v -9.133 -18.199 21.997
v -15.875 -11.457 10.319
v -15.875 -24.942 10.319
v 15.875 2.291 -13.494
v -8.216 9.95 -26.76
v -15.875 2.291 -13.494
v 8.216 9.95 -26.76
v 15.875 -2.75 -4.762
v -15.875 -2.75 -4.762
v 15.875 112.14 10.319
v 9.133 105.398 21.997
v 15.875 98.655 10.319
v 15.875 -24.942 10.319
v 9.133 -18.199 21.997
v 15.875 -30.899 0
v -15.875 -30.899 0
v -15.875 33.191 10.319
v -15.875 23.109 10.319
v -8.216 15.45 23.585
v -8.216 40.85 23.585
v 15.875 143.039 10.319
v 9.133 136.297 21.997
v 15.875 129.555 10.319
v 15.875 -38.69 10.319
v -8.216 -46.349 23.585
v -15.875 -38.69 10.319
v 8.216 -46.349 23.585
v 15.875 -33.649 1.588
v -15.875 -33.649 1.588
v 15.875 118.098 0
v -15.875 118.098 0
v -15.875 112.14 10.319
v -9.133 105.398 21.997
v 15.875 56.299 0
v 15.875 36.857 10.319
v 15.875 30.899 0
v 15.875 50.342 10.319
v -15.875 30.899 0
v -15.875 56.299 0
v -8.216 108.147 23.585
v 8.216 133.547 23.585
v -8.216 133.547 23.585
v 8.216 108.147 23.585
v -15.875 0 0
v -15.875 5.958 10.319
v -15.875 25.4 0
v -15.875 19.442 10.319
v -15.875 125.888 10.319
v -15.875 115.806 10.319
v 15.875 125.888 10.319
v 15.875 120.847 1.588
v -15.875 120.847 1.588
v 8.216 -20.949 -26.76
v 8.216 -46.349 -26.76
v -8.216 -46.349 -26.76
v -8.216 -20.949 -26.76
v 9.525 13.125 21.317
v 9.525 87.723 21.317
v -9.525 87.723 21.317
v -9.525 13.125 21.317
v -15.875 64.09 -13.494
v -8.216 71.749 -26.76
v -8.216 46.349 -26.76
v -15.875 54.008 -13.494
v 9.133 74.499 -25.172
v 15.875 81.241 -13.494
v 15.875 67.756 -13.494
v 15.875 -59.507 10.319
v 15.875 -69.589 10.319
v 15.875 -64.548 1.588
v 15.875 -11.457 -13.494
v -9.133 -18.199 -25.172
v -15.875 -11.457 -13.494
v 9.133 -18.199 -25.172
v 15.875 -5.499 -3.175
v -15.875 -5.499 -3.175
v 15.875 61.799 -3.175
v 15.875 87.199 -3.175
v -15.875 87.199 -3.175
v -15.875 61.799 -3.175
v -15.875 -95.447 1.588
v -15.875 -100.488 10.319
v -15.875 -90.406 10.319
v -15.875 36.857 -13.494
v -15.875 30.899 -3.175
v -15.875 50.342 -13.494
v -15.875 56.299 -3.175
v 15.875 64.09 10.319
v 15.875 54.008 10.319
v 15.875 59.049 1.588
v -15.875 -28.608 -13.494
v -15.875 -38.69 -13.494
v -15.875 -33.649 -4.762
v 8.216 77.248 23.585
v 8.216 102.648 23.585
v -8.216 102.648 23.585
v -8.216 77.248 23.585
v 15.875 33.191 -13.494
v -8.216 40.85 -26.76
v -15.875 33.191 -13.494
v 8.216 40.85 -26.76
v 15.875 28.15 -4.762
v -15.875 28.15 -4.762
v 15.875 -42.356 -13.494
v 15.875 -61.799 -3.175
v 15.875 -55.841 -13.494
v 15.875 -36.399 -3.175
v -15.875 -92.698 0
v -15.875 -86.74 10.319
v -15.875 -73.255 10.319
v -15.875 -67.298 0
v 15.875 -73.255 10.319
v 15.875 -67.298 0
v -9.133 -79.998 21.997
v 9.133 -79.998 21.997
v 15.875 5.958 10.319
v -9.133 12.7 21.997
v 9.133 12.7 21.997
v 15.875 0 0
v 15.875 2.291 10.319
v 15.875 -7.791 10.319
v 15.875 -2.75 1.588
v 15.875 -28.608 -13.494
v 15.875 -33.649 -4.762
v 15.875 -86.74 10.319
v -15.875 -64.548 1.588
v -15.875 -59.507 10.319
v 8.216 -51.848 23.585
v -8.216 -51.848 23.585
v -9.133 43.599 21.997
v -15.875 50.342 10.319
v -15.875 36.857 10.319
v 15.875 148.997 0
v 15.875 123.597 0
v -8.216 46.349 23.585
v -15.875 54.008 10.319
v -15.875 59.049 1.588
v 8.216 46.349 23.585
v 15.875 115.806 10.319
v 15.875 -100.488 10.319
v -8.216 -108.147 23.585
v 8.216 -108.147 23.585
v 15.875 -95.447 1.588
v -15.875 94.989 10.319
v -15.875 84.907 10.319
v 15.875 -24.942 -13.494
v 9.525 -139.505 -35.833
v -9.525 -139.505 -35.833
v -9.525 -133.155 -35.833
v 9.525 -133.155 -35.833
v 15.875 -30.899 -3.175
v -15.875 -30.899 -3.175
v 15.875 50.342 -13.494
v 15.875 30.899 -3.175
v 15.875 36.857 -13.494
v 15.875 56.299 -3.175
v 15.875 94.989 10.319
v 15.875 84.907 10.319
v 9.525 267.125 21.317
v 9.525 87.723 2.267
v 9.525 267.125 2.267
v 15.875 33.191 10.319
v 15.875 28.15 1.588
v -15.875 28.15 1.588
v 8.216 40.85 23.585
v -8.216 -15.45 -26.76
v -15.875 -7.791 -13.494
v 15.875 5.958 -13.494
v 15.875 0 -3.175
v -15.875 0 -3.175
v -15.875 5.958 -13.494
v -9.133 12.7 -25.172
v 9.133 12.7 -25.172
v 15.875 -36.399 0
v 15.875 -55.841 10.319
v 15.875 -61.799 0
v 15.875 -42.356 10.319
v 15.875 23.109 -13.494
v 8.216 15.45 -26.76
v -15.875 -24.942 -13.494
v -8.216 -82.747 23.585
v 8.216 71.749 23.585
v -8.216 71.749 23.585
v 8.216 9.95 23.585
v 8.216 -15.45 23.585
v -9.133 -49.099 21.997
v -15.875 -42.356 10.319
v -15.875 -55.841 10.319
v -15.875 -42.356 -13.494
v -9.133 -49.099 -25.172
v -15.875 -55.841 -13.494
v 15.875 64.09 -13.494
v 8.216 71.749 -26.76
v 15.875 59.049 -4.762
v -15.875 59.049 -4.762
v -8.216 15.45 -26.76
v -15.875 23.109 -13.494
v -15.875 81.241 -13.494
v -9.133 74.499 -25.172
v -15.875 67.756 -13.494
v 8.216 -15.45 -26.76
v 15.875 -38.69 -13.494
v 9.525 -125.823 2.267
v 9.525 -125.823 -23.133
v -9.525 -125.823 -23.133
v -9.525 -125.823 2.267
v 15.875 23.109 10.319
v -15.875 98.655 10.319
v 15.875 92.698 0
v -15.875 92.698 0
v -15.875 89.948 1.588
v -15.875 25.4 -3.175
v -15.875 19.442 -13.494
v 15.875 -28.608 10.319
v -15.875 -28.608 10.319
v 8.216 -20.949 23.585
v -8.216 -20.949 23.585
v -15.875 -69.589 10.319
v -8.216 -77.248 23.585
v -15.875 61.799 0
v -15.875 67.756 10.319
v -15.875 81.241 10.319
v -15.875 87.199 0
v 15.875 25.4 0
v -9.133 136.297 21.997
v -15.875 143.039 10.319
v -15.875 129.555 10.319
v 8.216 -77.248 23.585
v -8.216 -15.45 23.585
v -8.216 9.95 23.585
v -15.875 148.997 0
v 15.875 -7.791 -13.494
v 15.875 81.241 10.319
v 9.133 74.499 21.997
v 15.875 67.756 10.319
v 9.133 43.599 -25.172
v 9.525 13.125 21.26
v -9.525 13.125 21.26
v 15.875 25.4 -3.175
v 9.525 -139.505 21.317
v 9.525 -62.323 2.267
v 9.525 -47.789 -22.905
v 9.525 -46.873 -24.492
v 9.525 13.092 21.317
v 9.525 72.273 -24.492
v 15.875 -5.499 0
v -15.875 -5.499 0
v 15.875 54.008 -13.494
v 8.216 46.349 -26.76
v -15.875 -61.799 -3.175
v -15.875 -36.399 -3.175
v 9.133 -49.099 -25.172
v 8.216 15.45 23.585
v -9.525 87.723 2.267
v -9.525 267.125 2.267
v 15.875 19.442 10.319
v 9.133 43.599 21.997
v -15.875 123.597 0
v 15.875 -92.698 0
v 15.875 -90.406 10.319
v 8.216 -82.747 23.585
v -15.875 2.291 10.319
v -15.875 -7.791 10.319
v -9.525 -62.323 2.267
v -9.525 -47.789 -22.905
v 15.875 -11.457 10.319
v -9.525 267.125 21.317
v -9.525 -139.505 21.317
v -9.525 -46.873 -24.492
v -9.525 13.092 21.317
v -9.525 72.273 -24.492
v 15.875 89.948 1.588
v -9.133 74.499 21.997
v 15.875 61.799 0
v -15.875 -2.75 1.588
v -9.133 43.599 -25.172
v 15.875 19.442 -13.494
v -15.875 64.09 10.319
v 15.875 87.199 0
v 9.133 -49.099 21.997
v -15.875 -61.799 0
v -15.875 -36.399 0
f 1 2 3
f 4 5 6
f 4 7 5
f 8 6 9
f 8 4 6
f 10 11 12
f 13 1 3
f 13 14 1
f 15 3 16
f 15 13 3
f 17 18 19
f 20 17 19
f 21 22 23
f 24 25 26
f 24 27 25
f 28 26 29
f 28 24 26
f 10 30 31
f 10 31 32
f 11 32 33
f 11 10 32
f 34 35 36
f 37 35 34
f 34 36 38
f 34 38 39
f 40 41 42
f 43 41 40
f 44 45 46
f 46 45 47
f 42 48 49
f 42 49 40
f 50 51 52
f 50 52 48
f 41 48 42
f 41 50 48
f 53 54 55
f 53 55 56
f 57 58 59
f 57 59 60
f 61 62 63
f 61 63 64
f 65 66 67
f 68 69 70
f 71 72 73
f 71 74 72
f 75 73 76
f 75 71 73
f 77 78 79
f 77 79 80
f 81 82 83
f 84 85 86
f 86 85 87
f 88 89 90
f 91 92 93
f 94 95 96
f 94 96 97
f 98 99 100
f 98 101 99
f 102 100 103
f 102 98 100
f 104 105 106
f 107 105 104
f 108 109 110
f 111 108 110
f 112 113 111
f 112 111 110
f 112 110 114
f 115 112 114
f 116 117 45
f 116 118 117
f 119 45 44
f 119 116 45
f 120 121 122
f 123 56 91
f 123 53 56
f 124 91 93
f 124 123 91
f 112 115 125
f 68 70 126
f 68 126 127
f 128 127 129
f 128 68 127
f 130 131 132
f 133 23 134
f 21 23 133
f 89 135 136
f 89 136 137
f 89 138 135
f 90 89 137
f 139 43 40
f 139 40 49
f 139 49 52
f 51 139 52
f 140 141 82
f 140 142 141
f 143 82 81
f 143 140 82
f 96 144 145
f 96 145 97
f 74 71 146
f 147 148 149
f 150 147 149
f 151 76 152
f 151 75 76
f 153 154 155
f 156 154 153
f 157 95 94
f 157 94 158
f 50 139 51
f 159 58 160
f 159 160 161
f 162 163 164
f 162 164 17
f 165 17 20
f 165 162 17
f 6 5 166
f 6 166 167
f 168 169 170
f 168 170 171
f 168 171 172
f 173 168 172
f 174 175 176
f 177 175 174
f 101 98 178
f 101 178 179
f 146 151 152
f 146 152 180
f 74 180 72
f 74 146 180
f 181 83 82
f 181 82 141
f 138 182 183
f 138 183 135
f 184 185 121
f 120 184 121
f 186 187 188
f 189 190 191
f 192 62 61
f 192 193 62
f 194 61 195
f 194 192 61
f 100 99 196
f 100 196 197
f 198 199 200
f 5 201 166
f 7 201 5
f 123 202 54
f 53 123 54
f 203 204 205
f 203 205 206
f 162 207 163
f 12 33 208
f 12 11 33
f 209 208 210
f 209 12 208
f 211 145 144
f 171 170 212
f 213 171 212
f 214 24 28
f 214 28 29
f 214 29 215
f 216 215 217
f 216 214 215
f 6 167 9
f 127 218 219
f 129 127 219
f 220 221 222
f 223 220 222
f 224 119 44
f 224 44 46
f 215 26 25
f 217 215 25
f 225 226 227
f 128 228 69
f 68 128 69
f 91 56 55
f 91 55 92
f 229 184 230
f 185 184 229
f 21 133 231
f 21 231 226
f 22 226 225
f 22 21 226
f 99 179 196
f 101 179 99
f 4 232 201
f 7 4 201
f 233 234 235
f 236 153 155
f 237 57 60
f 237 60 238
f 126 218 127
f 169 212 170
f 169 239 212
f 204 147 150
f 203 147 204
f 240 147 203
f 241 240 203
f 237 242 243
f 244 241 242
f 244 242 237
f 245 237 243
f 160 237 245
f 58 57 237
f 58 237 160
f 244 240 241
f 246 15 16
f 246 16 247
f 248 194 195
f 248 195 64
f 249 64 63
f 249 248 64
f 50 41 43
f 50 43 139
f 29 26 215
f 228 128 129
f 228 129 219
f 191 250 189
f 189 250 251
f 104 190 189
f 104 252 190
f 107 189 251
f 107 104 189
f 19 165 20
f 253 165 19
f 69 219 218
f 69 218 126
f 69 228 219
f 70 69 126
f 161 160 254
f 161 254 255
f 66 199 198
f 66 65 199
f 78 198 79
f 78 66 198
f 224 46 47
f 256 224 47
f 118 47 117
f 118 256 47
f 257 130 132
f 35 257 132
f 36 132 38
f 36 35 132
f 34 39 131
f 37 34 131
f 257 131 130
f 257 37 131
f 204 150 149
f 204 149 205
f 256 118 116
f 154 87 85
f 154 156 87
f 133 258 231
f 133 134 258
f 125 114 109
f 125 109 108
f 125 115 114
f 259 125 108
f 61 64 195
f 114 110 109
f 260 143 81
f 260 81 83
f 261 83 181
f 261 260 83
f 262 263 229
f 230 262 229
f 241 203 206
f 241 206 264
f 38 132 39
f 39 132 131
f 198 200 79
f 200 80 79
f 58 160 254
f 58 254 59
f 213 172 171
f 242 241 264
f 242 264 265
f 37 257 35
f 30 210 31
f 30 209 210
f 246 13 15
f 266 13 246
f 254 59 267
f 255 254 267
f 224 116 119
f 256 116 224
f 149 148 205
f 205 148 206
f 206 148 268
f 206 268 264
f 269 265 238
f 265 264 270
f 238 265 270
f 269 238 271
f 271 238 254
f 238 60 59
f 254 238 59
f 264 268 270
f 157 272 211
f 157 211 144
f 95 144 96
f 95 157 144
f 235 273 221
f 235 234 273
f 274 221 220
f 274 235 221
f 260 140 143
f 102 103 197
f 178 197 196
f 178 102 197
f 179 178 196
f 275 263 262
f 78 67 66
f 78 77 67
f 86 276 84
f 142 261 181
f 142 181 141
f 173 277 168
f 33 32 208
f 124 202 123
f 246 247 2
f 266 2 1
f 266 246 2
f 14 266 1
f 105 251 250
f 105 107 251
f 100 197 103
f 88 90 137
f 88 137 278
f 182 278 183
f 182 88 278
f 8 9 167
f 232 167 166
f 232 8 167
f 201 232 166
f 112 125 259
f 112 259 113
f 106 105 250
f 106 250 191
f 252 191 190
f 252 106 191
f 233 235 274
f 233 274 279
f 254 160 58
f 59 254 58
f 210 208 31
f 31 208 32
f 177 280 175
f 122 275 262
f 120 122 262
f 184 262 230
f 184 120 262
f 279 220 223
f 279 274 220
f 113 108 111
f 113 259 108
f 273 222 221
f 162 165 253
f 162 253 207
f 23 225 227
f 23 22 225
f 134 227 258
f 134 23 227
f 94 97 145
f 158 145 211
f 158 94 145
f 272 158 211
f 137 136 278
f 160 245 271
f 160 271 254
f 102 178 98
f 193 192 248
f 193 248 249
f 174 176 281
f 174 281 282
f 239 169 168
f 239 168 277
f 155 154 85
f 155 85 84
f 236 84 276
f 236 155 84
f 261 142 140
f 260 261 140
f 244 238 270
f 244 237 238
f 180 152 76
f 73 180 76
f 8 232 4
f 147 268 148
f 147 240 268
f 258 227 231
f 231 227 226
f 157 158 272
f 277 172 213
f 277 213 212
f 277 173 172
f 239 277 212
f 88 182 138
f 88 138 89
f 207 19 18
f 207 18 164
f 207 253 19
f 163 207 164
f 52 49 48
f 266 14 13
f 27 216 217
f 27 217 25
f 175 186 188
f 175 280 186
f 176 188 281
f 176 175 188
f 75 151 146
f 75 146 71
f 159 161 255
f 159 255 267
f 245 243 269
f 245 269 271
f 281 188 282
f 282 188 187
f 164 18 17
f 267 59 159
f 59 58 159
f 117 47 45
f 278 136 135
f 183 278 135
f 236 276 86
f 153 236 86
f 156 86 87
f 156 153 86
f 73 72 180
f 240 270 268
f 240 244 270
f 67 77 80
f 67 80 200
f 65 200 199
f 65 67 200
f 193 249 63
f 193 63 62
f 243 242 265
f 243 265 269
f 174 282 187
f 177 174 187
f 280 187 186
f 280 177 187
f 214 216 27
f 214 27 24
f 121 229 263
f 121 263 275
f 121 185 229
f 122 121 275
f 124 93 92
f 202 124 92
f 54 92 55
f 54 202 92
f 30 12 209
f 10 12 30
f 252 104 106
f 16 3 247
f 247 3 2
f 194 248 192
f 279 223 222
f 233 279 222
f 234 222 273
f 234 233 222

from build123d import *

# Parameters (mm, degrees)
F1_W     = 3.175
F1_H     = 9.525
F2_DEPTH = 9.525
F1_W_2   = 179.4027834434
F1_H_2   = 19.05
F3_DEPTH = 9.525
F4_DEPTH = 15.875
F6_DEPTH = 177.8


with BuildPart() as f2:
    # F1 (on Right) → F2 (new body, symmetric)
    with BuildSketch(Plane.YZ):
        Polygon((-37.7075152621, 2.2672726281), (-48.7060378902, 21.3172726281), (-139.5049298612, 21.3172726281), (-139.5049298612, -35.8327273719), (-133.1549298612, -35.8327273719), (-125.8225814425, -23.1327273719), (-125.8225814425, 2.2672726281), (-62.3225814425, 2.2672726281), align=None)
        Polygon((-29.5902419379, 2.2672726281), (-18.5917193098, 21.3172726281), (-48.7060378902, 21.3172726281), (-37.7075152621, 2.2672726281), align=None)
        Polygon((-6.8082628621, 2.2672726281), (-17.8067854902, 21.3172726281), (-18.5917193098, 21.3172726281), (-29.5902419379, 2.2672726281), align=None)
        Polygon((9.950378257, 17.2345606957), (9.950378257, 21.3172726281), (-17.8067854902, 21.3172726281), (-6.8082628621, 2.2672726281), (1.3090104621, 2.2672726281), align=None)
        Polygon((13.125378257, 21.2602685025), (13.125378257, 11.7922726281), (13.125378257, 2.2672726281), (24.0909895379, 2.2672726281), align=None)
        with Locations((11.537878257, 7.0297726281)):
            Rectangle(F1_W, F1_H)
        Polygon((12.3075330902, 21.3172726281), (9.950378257, 17.2345606957), (9.950378257, 11.7922726281), (13.125378257, 11.7922726281), (13.125378257, 21.2602685025), (13.0924669098, 21.3172726281), align=None)
        Polygon((9.950378257, 11.7922726281), (9.950378257, 17.2345606957), (1.3090104621, 2.2672726281), (9.950378257, 2.2672726281), align=None)
        Polygon((12.3075330902, 21.3172726281), (9.950378257, 21.3172726281), (9.950378257, 17.2345606957), align=None)
        Polygon((13.125378257, 21.3172726281), (13.125378257, 21.2602685025), (24.0909895379, 2.2672726281), (87.7225948136, 2.2672726281), (87.7225948136, 21.3172726281), align=None)
        Polygon((0, 0), (1.3090104621, 2.2672726281), (-6.8082628621, 2.2672726281), (-5.4992524, 0), (-30.8992524, 0), (-29.5902419379, 2.2672726281), (-37.7075152621, 2.2672726281), (-62.3225814425, 2.2672726281), (-51.9763694491, -15.6528922105), (-47.7894943379, -22.9047726281), (-42.7485048, -14.1735226281), (-41.3736894715, -14.9672726281), (-44.8405059529, -24.4922726281), (-34.4873710954, -24.4922726281), (47.6579024332, -24.4922726281), (72.2729641566, -24.4922726281), (87.7225948136, 2.2672726281), (24.0909895379, 2.2672726281), (25.4, 0), (9.950378257, 0), align=None)
        Polygon((13.125378257, 2.2672726281), (9.950378257, 2.2672726281), (9.950378257, 0), (25.4, 0), (24.0909895379, 2.2672726281), align=None)
        Polygon((9.950378257, 2.2672726281), (1.3090104621, 2.2672726281), (0, 0), (9.950378257, 0), align=None)
        Polygon((-5.4992524, 0), (-6.8082628621, 2.2672726281), (-29.5902419379, 2.2672726281), (-30.8992524, 0), align=None)
        Polygon((-42.7485048, -14.1735226281), (-47.7894943379, -22.9047726281), (-46.8729507855, -24.4922726281), (-44.8405059529, -24.4922726281), (-41.3736894715, -14.9672726281), align=None)
    extrude(amount=F2_DEPTH, both=True)


with BuildPart() as f3:
    # F1 (on Right) → F3 (new body, symmetric)
    with BuildSketch(Plane.YZ):
        with Locations((177.4239865353, 11.7922726281)):
            Rectangle(F1_W_2, F1_H_2)
    extrude(amount=F3_DEPTH, both=True)


with BuildPart() as f4:
    # F0 (on Right) → F4 (new body, symmetric)
    with BuildSketch(Plane.YZ):
        Polygon((102.648144371, 23.5845452561), (77.248144371, 23.5845452561), (89.948144371, 1.5875), align=None)
    extrude(amount=F4_DEPTH, both=True)


with BuildPart() as f4b:
    # F0 (on Right) → F4, piece 2 (new body, symmetric)
    with BuildSketch(Plane.YZ):
        Polygon((61.798513714, 0), (87.198513714, 0), (74.498513714, 21.9970452561), align=None)
    extrude(amount=F4_DEPTH, both=True)


with BuildPart() as f4c:
    # F0 (on Right) → F4, piece 3 (new body, symmetric)
    with BuildSketch(Plane.YZ):
        Polygon((74.498513714, -25.1720452561), (87.198513714, -3.175), (61.798513714, -3.175), align=None)
    extrude(amount=F4_DEPTH, both=True)


with BuildPart() as f4d:
    # F0 (on Right) → F4, piece 4 (new body, symmetric)
    with BuildSketch(Plane.YZ):
        Polygon((71.748891971, -26.7595452561), (59.048891971, -4.7625), (46.348891971, -26.7595452561), align=None)
    extrude(amount=F4_DEPTH, both=True)


with BuildPart() as f4e:
    # F0 (on Right) → F4, piece 5 (new body, symmetric)
    with BuildSketch(Plane.YZ):
        Polygon((56.299261314, -3.175), (30.899261314, -3.175), (43.599261314, -25.1720452561), align=None)
    extrude(amount=F4_DEPTH, both=True)


with BuildPart() as f4f:
    # F0 (on Right) → F4, piece 6 (new body, symmetric)
    with BuildSketch(Plane.YZ):
        Polygon((46.348891971, 23.5845452561), (59.048891971, 1.5875), (71.748891971, 23.5845452561), align=None)
    extrude(amount=F4_DEPTH, both=True)


with BuildPart() as f4g:
    # F0 (on Right) → F4, piece 7 (new body, symmetric)
    with BuildSketch(Plane.YZ):
        Polygon((43.599261314, 21.9970452561), (30.899261314, 0), (43.599261314, 0), (56.299261314, 0), align=None)
    extrude(amount=F4_DEPTH, both=True)


with BuildPart() as f4h:
    # F0 (on Right) → F4, piece 8 (new body, symmetric)
    with BuildSketch(Plane.YZ):
        Polygon((40.849630657, -26.7595452561), (28.149630657, -4.7625), (15.449630657, -26.7595452561), align=None)
    extrude(amount=F4_DEPTH, both=True)


with BuildPart() as f4i:
    # F0 (on Right) → F4, piece 9 (new body, symmetric)
    with BuildSketch(Plane.YZ):
        Polygon((15.449630657, 23.5845452561), (28.149630657, 1.5875), (40.849630657, 23.5845452561), align=None)
    extrude(amount=F4_DEPTH, both=True)


with BuildPart() as f4j:
    # F0 (on Right) → F4, piece 10 (new body, symmetric)
    with BuildSketch(Plane.YZ):
        Polygon((12.7, 21.9970452561), (0, 0), (25.4, 0), align=None)
    extrude(amount=F4_DEPTH, both=True)


with BuildPart() as f4k:
    # F0 (on Right) → F4, piece 11 (new body, symmetric)
    with BuildSketch(Plane.YZ):
        Polygon((25.4, -3.175), (0, -3.175), (12.7, -25.1720452561), align=None)
    extrude(amount=F4_DEPTH, both=True)


with BuildPart() as f4l:
    # F0 (on Right) → F4, piece 12 (new body, symmetric)
    with BuildSketch(Plane.YZ):
        Polygon((9.950378257, -26.7595452561), (-2.749621743, -4.7625), (-15.449621743, -26.7595452561), align=None)
    extrude(amount=F4_DEPTH, both=True)


with BuildPart() as f4m:
    # F0 (on Right) → F4, piece 13 (new body, symmetric)
    with BuildSketch(Plane.YZ):
        Polygon((-15.449621743, 23.5845452561), (-2.749621743, 1.5875), (9.950378257, 23.5845452561), align=None)
    extrude(amount=F4_DEPTH, both=True)


with BuildPart() as f4n:
    # F0 (on Right) → F4, piece 14 (new body, symmetric)
    with BuildSketch(Plane.YZ):
        Polygon((-18.1992524, 21.9970452561), (-30.8992524, 0), (-5.4992524, 0), align=None)
    extrude(amount=F4_DEPTH, both=True)


with BuildPart() as f4o:
    # F0 (on Right) → F4, piece 15 (new body, symmetric)
    with BuildSketch(Plane.YZ):
        Polygon((-5.4992524, -3.175), (-30.8992524, -3.175), (-18.1992524, -25.1720452561), align=None)
    extrude(amount=F4_DEPTH, both=True)


with BuildPart() as f4p:
    # F0 (on Right) → F4, piece 16 (new body, symmetric)
    with BuildSketch(Plane.YZ):
        Polygon((-20.948874143, -26.7595452561), (-33.648874143, -4.7625), (-46.348874143, -26.7595452561), align=None)
    extrude(amount=F4_DEPTH, both=True)


with BuildPart() as f4q:
    # F0 (on Right) → F4, piece 17 (new body, symmetric)
    with BuildSketch(Plane.YZ):
        Polygon((-46.348874143, 23.5845452561), (-33.648874143, 1.5875), (-20.948874143, 23.5845452561), align=None)
    extrude(amount=F4_DEPTH, both=True)


with BuildPart() as f4r:
    # F0 (on Right) → F4, piece 18 (new body, symmetric)
    with BuildSketch(Plane.YZ):
        Polygon((-49.0985048, 21.9970452561), (-61.7985048, 0), (-36.3985048, 0), align=None)
    extrude(amount=F4_DEPTH, both=True)


with BuildPart() as f4s:
    # F0 (on Right) → F4, piece 19 (new body, symmetric)
    with BuildSketch(Plane.YZ):
        Polygon((-36.3985048, -3.175), (-61.7985048, -3.175), (-49.0985048, -25.1720452561), align=None)
    extrude(amount=F4_DEPTH, both=True)


with BuildPart() as f4t:
    # F0 (on Right) → F4, piece 20 (new body, symmetric)
    with BuildSketch(Plane.YZ):
        Polygon((-77.248126543, 23.5845452561), (-64.548126543, 1.5875), (-51.848126543, 23.5845452561), align=None)
    extrude(amount=F4_DEPTH, both=True)


with BuildPart() as f4u:
    # F0 (on Right) → F4, piece 21 (new body, symmetric)
    with BuildSketch(Plane.YZ):
        Polygon((-92.6977572, 0), (-67.2977572, 0), (-79.9977572, 21.9970452561), align=None)
    extrude(amount=F4_DEPTH, both=True)


with BuildPart() as f4v:
    # F0 (on Right) → F4, piece 22 (new body, symmetric)
    with BuildSketch(Plane.YZ):
        Polygon((-95.447378943, 1.5875), (-82.747378943, 23.5845452561), (-108.147378943, 23.5845452561), align=None)
    extrude(amount=F4_DEPTH, both=True)


with BuildPart() as f4w:
    # F0 (on Right) → F4, piece 23 (new body, symmetric)
    with BuildSketch(Plane.YZ):
        Polygon((92.697766114, 0), (118.097766114, 0), (105.397766114, 21.9970452561), align=None)
    extrude(amount=F4_DEPTH, both=True)


with BuildPart() as f4x:
    # F0 (on Right) → F4, piece 24 (new body, symmetric)
    with BuildSketch(Plane.YZ):
        Polygon((133.547396771, 23.5845452561), (108.147396771, 23.5845452561), (120.847396771, 1.5875), align=None)
    extrude(amount=F4_DEPTH, both=True)


with BuildPart() as f4y:
    # F0 (on Right) → F4, piece 25 (new body, symmetric)
    with BuildSketch(Plane.YZ):
        Polygon((123.597018514, 0), (148.997018514, 0), (136.297018514, 21.9970452561), align=None)
    extrude(amount=F4_DEPTH, both=True)


with BuildPart() as f6_tool:
    # F5 (on Front) → F6 (new body, symmetric)
    with BuildSketch(Plane.XZ):
        Polygon((8.2159895379, -26.7595452561), (15.875, -26.7595452561), (15.875, -13.49375), (9.525, -24.4922726281), align=None)
        Polygon((-15.875, -26.7595452561), (-8.2159895379, -26.7595452561), (-9.525, -24.4922726281), (-15.875, -13.49375), align=None)
        Polygon((-9.525, 21.3172726281), (-8.2159895379, 23.5845452561), (-15.875, 23.5845452561), (-15.875, 10.31875), align=None)
        Polygon((15.875, 10.31875), (15.875, 23.5845452561), (8.2159895379, 23.5845452561), (9.525, 21.3172726281), align=None)
    extrude(amount=F6_DEPTH, both=True)


with BuildPart() as f4_1:
    add(f4.part)

    # F6: cut by f6_tool
    add(f6_tool.part, mode=Mode.SUBTRACT)


with BuildPart() as f4b_1:
    add(f4b.part)

    # F6: cut by f6_tool
    add(f6_tool.part, mode=Mode.SUBTRACT)


with BuildPart() as f4c_1:
    add(f4c.part)

    # F6: cut by f6_tool
    add(f6_tool.part, mode=Mode.SUBTRACT)


with BuildPart() as f4d_1:
    add(f4d.part)

    # F6: cut by f6_tool
    add(f6_tool.part, mode=Mode.SUBTRACT)


with BuildPart() as f4e_1:
    add(f4e.part)

    # F6: cut by f6_tool
    add(f6_tool.part, mode=Mode.SUBTRACT)


with BuildPart() as f4f_1:
    add(f4f.part)

    # F6: cut by f6_tool
    add(f6_tool.part, mode=Mode.SUBTRACT)


with BuildPart() as f4g_1:
    add(f4g.part)

    # F6: cut by f6_tool
    add(f6_tool.part, mode=Mode.SUBTRACT)


with BuildPart() as f4h_1:
    add(f4h.part)

    # F6: cut by f6_tool
    add(f6_tool.part, mode=Mode.SUBTRACT)


with BuildPart() as f4i_1:
    add(f4i.part)

    # F6: cut by f6_tool
    add(f6_tool.part, mode=Mode.SUBTRACT)


with BuildPart() as f4j_1:
    add(f4j.part)

    # F6: cut by f6_tool
    add(f6_tool.part, mode=Mode.SUBTRACT)


with BuildPart() as f4k_1:
    add(f4k.part)

    # F6: cut by f6_tool
    add(f6_tool.part, mode=Mode.SUBTRACT)


with BuildPart() as f4l_1:
    add(f4l.part)

    # F6: cut by f6_tool
    add(f6_tool.part, mode=Mode.SUBTRACT)


with BuildPart() as f4m_1:
    add(f4m.part)

    # F6: cut by f6_tool
    add(f6_tool.part, mode=Mode.SUBTRACT)


with BuildPart() as f4n_1:
    add(f4n.part)

    # F6: cut by f6_tool
    add(f6_tool.part, mode=Mode.SUBTRACT)


with BuildPart() as f4o_1:
    add(f4o.part)

    # F6: cut by f6_tool
    add(f6_tool.part, mode=Mode.SUBTRACT)


with BuildPart() as f4p_1:
    add(f4p.part)

    # F6: cut by f6_tool
    add(f6_tool.part, mode=Mode.SUBTRACT)


with BuildPart() as f4q_1:
    add(f4q.part)

    # F6: cut by f6_tool
    add(f6_tool.part, mode=Mode.SUBTRACT)


with BuildPart() as f4r_1:
    add(f4r.part)

    # F6: cut by f6_tool
    add(f6_tool.part, mode=Mode.SUBTRACT)


with BuildPart() as f4s_1:
    add(f4s.part)

    # F6: cut by f6_tool
    add(f6_tool.part, mode=Mode.SUBTRACT)


with BuildPart() as f4t_1:
    add(f4t.part)

    # F6: cut by f6_tool
    add(f6_tool.part, mode=Mode.SUBTRACT)


with BuildPart() as f4u_1:
    add(f4u.part)

    # F6: cut by f6_tool
    add(f6_tool.part, mode=Mode.SUBTRACT)


with BuildPart() as f4v_1:
    add(f4v.part)

    # F6: cut by f6_tool
    add(f6_tool.part, mode=Mode.SUBTRACT)


with BuildPart() as f4w_1:
    add(f4w.part)

    # F6: cut by f6_tool
    add(f6_tool.part, mode=Mode.SUBTRACT)


with BuildPart() as f4x_1:
    add(f4x.part)

    # F6: cut by f6_tool
    add(f6_tool.part, mode=Mode.SUBTRACT)


with BuildPart() as f4y_1:
    add(f4y.part)

    # F6: cut by f6_tool
    add(f6_tool.part, mode=Mode.SUBTRACT)


solid = Compound([f2.part, f3.part, f4_1.part, f4b_1.part, f4c_1.part, f4d_1.part, f4e_1.part, f4f_1.part, f4g_1.part, f4h_1.part, f4i_1.part, f4j_1.part, f4k_1.part, f4l_1.part, f4m_1.part, f4n_1.part, f4o_1.part, f4p_1.part, f4q_1.part, f4r_1.part, f4s_1.part, f4t_1.part, f4u_1.part, f4v_1.part, f4w_1.part, f4x_1.part, f4y_1.part])
